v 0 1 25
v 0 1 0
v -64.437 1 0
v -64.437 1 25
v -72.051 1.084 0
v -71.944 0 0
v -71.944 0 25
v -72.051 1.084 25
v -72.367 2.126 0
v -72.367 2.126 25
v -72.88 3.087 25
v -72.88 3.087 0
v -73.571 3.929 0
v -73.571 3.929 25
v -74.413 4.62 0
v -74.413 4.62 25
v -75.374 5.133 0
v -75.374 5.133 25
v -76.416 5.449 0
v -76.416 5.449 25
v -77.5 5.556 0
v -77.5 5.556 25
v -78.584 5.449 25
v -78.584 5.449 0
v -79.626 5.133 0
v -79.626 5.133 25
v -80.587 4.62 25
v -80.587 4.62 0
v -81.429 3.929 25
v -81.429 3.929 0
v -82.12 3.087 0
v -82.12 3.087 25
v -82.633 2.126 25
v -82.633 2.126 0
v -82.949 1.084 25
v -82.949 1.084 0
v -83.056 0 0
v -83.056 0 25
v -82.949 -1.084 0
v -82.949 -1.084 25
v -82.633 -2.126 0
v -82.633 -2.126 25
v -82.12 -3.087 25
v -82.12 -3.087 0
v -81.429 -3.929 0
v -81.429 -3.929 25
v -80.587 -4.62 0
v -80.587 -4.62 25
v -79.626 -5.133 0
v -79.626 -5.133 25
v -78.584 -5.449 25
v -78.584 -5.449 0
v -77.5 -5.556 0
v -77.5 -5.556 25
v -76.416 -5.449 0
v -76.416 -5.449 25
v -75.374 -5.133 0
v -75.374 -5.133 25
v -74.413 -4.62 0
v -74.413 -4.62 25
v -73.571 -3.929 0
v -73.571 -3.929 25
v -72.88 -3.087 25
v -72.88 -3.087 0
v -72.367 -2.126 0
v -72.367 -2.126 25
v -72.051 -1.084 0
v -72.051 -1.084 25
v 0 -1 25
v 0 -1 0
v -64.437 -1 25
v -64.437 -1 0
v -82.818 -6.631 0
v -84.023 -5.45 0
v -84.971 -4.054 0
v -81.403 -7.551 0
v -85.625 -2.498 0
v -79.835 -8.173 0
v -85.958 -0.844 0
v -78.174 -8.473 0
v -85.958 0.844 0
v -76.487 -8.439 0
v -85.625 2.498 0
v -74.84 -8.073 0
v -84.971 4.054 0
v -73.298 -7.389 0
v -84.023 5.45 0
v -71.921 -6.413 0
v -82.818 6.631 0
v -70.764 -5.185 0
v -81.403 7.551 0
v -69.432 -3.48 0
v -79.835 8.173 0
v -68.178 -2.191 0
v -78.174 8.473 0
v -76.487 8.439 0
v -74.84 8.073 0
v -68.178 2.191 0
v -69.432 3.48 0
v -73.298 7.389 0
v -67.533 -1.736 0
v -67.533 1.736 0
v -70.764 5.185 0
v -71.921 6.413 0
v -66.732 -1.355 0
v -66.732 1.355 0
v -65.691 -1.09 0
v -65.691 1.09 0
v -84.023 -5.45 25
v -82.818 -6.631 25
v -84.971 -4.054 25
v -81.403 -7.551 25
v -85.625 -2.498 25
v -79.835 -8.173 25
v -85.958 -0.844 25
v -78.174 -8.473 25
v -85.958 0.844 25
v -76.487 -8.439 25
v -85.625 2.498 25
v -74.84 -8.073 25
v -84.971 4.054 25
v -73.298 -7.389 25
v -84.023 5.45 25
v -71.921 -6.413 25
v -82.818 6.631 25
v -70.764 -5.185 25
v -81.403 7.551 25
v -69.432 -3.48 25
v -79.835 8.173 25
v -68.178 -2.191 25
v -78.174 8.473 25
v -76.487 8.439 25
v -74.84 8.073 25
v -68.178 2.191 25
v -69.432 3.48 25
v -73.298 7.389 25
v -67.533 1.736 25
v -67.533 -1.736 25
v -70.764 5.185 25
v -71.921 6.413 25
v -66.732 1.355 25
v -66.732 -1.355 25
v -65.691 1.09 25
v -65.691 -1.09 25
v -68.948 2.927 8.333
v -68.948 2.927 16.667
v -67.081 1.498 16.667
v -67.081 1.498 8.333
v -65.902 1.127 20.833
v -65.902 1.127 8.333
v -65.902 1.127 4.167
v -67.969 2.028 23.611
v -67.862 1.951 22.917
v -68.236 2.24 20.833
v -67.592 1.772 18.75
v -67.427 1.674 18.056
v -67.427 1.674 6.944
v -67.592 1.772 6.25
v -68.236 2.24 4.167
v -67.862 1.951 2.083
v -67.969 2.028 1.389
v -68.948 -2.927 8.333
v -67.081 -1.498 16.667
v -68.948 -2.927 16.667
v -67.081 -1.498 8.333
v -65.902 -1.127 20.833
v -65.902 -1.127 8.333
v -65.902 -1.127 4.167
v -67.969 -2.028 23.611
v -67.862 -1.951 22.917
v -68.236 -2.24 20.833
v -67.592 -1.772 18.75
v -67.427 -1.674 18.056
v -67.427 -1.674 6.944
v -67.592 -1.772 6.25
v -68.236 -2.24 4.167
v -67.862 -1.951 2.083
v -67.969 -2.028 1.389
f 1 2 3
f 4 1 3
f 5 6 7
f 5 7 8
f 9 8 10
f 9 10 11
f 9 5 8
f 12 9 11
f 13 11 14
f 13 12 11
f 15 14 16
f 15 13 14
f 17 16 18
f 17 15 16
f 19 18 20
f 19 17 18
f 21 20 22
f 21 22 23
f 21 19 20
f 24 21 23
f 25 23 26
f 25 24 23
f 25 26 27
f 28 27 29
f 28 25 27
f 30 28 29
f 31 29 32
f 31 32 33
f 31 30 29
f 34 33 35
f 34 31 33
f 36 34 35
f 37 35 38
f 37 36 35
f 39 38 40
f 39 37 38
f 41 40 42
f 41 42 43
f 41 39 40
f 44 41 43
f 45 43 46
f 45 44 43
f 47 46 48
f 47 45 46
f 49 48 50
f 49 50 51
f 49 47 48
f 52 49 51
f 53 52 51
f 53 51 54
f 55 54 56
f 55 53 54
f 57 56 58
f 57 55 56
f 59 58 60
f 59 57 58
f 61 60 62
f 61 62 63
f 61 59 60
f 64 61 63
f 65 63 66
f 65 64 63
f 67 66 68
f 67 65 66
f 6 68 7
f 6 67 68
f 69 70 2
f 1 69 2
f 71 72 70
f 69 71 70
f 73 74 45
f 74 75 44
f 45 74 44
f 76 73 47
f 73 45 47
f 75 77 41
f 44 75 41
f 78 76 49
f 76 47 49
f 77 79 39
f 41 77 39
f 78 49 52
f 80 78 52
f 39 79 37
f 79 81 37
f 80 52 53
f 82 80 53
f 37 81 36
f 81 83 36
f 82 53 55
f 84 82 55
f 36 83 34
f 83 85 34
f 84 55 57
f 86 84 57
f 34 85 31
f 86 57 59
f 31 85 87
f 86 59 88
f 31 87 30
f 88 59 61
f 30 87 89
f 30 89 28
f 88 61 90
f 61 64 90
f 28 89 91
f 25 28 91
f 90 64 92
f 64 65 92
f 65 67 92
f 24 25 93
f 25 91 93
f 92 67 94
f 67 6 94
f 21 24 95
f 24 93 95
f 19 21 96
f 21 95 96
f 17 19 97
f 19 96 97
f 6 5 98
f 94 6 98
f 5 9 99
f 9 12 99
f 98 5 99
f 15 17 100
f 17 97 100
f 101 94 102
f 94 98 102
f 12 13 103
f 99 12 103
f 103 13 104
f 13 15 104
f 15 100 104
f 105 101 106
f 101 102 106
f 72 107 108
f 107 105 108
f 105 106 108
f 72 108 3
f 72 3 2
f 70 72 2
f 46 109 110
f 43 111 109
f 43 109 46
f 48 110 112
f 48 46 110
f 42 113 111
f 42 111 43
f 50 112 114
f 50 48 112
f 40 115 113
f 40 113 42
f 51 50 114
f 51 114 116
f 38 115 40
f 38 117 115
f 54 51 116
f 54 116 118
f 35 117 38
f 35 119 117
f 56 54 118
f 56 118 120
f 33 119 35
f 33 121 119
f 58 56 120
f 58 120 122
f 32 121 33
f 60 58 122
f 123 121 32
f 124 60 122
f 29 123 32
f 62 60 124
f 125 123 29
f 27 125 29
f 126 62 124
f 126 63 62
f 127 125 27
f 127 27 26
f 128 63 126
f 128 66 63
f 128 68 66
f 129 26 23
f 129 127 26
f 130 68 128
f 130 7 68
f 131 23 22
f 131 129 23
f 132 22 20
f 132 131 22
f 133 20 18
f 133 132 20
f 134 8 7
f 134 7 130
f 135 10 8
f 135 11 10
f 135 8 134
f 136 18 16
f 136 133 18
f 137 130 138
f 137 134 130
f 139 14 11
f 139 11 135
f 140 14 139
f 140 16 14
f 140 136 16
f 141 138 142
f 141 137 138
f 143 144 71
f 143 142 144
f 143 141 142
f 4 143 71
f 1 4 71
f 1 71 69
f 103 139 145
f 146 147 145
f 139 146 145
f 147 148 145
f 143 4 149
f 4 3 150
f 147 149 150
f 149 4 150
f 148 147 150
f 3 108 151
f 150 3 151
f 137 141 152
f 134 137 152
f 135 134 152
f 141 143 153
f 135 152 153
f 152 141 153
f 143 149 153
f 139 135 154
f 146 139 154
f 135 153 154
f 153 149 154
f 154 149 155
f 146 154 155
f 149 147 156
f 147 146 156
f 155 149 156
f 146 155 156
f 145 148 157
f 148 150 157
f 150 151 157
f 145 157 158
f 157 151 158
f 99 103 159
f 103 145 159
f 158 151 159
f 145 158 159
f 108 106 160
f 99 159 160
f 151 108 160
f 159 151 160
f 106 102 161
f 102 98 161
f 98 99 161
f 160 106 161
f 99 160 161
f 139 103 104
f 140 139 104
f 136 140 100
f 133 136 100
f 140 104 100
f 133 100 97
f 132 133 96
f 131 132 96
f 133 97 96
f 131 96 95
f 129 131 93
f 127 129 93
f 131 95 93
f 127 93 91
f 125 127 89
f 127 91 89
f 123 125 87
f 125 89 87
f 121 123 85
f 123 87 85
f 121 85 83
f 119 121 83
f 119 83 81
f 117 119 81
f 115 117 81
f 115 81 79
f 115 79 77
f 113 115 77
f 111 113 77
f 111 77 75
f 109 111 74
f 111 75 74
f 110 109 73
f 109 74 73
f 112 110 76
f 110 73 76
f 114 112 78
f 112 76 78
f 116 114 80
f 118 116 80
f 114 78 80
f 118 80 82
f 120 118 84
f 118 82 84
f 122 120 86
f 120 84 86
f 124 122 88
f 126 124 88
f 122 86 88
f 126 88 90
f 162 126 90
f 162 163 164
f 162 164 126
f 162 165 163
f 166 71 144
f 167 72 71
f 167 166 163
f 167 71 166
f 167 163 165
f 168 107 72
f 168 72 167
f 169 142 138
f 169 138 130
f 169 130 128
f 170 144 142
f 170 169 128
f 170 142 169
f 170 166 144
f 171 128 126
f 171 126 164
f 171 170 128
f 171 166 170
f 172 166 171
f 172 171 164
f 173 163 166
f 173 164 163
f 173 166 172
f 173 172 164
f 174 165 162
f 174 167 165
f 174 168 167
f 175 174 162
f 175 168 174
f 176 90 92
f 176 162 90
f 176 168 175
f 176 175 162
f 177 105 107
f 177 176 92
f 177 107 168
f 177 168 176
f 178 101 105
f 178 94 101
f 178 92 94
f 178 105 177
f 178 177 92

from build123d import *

# Parameters (mm, degrees)
F0_R     = 5.55625
F1_DEPTH = 25


# Not quite as in the source:
# - a feature names something its author has since deleted; it is built from what else it names


with BuildPart() as f1:
    # F0 (on Top) → F1 (new body)
    with BuildSketch(Plane.XY):
        with BuildLine():
            ThreePointArc((-69.0590284919, -1), (-69.0147699554, -0.5008703332), (-69, 0))
            ThreePointArc((-69, 0), (-69.0147699554, 0.5008703332), (-69.0590284919, 1))
            ThreePointArc((-69.0590284919, 1), (-69.6284732517, 3.2076575021), (-70.7642342114, 5.184540408))
            ThreePointArc((-70.7642342114, 5.184540408), (-86, 0), (-70.7642342114, -5.184540408))
            ThreePointArc((-70.7642342114, -5.184540408), (-69.6284732517, -3.2076575021), (-69.0590284919, -1))
        make_face()
        with Locations((-77.5, 0)):
            Circle(F0_R, mode=Mode.SUBTRACT)
        with BuildLine():
            ThreePointArc((-70.7642342114, 5.184540408), (-69.6284732517, 3.2076575021), (-69.0590284919, 1))
            Line((-69.0590284919, 1), (-64.4374042749, 1))
            add(Edge.make_bspline(
                [(-64.4374042749, 1), (-67.7107125521, 1), (-68.7326164375, 2.5450583285), (-70.7642342114, 5.184540408)],
                knots=[0, 0, 0, 0, 7.58545684, 7.58545684, 7.58545684, 7.58545684], degree=3))
        make_face()
        with BuildLine():
            Line((-64.4374042749, -1), (-69.0590284919, -1))
            ThreePointArc((-69.0590284919, -1), (-69.6284732517, -3.2076575021), (-70.7642342114, -5.184540408))
            add(Edge.make_bspline(
                [(-64.4374042749, -1), (-67.7107125521, -1), (-68.7326164375, -2.5450583285), (-70.7642342114, -5.184540408)],
                knots=[0, 0, 0, 0, 7.58545684, 7.58545684, 7.58545684, 7.58545684], degree=3))
        make_face()
        with BuildLine():
            ThreePointArc((-69.0590284919, 1), (-69.0147699554, 0.5008703332), (-69, 0))
            ThreePointArc((-69, 0), (-69.0147699554, -0.5008703332), (-69.0590284919, -1))
            Line((-69.0590284919, -1), (-64.4374042749, -1))
            Line((-64.4374042749, -1), (0, -1))
            Line((0, -1), (0, 1))
            Line((0, 1), (-64.4374042749, 1))
            Line((-64.4374042749, 1), (-69.0590284919, 1))
        make_face()
    extrude(amount=F1_DEPTH)


solid = f1.part
